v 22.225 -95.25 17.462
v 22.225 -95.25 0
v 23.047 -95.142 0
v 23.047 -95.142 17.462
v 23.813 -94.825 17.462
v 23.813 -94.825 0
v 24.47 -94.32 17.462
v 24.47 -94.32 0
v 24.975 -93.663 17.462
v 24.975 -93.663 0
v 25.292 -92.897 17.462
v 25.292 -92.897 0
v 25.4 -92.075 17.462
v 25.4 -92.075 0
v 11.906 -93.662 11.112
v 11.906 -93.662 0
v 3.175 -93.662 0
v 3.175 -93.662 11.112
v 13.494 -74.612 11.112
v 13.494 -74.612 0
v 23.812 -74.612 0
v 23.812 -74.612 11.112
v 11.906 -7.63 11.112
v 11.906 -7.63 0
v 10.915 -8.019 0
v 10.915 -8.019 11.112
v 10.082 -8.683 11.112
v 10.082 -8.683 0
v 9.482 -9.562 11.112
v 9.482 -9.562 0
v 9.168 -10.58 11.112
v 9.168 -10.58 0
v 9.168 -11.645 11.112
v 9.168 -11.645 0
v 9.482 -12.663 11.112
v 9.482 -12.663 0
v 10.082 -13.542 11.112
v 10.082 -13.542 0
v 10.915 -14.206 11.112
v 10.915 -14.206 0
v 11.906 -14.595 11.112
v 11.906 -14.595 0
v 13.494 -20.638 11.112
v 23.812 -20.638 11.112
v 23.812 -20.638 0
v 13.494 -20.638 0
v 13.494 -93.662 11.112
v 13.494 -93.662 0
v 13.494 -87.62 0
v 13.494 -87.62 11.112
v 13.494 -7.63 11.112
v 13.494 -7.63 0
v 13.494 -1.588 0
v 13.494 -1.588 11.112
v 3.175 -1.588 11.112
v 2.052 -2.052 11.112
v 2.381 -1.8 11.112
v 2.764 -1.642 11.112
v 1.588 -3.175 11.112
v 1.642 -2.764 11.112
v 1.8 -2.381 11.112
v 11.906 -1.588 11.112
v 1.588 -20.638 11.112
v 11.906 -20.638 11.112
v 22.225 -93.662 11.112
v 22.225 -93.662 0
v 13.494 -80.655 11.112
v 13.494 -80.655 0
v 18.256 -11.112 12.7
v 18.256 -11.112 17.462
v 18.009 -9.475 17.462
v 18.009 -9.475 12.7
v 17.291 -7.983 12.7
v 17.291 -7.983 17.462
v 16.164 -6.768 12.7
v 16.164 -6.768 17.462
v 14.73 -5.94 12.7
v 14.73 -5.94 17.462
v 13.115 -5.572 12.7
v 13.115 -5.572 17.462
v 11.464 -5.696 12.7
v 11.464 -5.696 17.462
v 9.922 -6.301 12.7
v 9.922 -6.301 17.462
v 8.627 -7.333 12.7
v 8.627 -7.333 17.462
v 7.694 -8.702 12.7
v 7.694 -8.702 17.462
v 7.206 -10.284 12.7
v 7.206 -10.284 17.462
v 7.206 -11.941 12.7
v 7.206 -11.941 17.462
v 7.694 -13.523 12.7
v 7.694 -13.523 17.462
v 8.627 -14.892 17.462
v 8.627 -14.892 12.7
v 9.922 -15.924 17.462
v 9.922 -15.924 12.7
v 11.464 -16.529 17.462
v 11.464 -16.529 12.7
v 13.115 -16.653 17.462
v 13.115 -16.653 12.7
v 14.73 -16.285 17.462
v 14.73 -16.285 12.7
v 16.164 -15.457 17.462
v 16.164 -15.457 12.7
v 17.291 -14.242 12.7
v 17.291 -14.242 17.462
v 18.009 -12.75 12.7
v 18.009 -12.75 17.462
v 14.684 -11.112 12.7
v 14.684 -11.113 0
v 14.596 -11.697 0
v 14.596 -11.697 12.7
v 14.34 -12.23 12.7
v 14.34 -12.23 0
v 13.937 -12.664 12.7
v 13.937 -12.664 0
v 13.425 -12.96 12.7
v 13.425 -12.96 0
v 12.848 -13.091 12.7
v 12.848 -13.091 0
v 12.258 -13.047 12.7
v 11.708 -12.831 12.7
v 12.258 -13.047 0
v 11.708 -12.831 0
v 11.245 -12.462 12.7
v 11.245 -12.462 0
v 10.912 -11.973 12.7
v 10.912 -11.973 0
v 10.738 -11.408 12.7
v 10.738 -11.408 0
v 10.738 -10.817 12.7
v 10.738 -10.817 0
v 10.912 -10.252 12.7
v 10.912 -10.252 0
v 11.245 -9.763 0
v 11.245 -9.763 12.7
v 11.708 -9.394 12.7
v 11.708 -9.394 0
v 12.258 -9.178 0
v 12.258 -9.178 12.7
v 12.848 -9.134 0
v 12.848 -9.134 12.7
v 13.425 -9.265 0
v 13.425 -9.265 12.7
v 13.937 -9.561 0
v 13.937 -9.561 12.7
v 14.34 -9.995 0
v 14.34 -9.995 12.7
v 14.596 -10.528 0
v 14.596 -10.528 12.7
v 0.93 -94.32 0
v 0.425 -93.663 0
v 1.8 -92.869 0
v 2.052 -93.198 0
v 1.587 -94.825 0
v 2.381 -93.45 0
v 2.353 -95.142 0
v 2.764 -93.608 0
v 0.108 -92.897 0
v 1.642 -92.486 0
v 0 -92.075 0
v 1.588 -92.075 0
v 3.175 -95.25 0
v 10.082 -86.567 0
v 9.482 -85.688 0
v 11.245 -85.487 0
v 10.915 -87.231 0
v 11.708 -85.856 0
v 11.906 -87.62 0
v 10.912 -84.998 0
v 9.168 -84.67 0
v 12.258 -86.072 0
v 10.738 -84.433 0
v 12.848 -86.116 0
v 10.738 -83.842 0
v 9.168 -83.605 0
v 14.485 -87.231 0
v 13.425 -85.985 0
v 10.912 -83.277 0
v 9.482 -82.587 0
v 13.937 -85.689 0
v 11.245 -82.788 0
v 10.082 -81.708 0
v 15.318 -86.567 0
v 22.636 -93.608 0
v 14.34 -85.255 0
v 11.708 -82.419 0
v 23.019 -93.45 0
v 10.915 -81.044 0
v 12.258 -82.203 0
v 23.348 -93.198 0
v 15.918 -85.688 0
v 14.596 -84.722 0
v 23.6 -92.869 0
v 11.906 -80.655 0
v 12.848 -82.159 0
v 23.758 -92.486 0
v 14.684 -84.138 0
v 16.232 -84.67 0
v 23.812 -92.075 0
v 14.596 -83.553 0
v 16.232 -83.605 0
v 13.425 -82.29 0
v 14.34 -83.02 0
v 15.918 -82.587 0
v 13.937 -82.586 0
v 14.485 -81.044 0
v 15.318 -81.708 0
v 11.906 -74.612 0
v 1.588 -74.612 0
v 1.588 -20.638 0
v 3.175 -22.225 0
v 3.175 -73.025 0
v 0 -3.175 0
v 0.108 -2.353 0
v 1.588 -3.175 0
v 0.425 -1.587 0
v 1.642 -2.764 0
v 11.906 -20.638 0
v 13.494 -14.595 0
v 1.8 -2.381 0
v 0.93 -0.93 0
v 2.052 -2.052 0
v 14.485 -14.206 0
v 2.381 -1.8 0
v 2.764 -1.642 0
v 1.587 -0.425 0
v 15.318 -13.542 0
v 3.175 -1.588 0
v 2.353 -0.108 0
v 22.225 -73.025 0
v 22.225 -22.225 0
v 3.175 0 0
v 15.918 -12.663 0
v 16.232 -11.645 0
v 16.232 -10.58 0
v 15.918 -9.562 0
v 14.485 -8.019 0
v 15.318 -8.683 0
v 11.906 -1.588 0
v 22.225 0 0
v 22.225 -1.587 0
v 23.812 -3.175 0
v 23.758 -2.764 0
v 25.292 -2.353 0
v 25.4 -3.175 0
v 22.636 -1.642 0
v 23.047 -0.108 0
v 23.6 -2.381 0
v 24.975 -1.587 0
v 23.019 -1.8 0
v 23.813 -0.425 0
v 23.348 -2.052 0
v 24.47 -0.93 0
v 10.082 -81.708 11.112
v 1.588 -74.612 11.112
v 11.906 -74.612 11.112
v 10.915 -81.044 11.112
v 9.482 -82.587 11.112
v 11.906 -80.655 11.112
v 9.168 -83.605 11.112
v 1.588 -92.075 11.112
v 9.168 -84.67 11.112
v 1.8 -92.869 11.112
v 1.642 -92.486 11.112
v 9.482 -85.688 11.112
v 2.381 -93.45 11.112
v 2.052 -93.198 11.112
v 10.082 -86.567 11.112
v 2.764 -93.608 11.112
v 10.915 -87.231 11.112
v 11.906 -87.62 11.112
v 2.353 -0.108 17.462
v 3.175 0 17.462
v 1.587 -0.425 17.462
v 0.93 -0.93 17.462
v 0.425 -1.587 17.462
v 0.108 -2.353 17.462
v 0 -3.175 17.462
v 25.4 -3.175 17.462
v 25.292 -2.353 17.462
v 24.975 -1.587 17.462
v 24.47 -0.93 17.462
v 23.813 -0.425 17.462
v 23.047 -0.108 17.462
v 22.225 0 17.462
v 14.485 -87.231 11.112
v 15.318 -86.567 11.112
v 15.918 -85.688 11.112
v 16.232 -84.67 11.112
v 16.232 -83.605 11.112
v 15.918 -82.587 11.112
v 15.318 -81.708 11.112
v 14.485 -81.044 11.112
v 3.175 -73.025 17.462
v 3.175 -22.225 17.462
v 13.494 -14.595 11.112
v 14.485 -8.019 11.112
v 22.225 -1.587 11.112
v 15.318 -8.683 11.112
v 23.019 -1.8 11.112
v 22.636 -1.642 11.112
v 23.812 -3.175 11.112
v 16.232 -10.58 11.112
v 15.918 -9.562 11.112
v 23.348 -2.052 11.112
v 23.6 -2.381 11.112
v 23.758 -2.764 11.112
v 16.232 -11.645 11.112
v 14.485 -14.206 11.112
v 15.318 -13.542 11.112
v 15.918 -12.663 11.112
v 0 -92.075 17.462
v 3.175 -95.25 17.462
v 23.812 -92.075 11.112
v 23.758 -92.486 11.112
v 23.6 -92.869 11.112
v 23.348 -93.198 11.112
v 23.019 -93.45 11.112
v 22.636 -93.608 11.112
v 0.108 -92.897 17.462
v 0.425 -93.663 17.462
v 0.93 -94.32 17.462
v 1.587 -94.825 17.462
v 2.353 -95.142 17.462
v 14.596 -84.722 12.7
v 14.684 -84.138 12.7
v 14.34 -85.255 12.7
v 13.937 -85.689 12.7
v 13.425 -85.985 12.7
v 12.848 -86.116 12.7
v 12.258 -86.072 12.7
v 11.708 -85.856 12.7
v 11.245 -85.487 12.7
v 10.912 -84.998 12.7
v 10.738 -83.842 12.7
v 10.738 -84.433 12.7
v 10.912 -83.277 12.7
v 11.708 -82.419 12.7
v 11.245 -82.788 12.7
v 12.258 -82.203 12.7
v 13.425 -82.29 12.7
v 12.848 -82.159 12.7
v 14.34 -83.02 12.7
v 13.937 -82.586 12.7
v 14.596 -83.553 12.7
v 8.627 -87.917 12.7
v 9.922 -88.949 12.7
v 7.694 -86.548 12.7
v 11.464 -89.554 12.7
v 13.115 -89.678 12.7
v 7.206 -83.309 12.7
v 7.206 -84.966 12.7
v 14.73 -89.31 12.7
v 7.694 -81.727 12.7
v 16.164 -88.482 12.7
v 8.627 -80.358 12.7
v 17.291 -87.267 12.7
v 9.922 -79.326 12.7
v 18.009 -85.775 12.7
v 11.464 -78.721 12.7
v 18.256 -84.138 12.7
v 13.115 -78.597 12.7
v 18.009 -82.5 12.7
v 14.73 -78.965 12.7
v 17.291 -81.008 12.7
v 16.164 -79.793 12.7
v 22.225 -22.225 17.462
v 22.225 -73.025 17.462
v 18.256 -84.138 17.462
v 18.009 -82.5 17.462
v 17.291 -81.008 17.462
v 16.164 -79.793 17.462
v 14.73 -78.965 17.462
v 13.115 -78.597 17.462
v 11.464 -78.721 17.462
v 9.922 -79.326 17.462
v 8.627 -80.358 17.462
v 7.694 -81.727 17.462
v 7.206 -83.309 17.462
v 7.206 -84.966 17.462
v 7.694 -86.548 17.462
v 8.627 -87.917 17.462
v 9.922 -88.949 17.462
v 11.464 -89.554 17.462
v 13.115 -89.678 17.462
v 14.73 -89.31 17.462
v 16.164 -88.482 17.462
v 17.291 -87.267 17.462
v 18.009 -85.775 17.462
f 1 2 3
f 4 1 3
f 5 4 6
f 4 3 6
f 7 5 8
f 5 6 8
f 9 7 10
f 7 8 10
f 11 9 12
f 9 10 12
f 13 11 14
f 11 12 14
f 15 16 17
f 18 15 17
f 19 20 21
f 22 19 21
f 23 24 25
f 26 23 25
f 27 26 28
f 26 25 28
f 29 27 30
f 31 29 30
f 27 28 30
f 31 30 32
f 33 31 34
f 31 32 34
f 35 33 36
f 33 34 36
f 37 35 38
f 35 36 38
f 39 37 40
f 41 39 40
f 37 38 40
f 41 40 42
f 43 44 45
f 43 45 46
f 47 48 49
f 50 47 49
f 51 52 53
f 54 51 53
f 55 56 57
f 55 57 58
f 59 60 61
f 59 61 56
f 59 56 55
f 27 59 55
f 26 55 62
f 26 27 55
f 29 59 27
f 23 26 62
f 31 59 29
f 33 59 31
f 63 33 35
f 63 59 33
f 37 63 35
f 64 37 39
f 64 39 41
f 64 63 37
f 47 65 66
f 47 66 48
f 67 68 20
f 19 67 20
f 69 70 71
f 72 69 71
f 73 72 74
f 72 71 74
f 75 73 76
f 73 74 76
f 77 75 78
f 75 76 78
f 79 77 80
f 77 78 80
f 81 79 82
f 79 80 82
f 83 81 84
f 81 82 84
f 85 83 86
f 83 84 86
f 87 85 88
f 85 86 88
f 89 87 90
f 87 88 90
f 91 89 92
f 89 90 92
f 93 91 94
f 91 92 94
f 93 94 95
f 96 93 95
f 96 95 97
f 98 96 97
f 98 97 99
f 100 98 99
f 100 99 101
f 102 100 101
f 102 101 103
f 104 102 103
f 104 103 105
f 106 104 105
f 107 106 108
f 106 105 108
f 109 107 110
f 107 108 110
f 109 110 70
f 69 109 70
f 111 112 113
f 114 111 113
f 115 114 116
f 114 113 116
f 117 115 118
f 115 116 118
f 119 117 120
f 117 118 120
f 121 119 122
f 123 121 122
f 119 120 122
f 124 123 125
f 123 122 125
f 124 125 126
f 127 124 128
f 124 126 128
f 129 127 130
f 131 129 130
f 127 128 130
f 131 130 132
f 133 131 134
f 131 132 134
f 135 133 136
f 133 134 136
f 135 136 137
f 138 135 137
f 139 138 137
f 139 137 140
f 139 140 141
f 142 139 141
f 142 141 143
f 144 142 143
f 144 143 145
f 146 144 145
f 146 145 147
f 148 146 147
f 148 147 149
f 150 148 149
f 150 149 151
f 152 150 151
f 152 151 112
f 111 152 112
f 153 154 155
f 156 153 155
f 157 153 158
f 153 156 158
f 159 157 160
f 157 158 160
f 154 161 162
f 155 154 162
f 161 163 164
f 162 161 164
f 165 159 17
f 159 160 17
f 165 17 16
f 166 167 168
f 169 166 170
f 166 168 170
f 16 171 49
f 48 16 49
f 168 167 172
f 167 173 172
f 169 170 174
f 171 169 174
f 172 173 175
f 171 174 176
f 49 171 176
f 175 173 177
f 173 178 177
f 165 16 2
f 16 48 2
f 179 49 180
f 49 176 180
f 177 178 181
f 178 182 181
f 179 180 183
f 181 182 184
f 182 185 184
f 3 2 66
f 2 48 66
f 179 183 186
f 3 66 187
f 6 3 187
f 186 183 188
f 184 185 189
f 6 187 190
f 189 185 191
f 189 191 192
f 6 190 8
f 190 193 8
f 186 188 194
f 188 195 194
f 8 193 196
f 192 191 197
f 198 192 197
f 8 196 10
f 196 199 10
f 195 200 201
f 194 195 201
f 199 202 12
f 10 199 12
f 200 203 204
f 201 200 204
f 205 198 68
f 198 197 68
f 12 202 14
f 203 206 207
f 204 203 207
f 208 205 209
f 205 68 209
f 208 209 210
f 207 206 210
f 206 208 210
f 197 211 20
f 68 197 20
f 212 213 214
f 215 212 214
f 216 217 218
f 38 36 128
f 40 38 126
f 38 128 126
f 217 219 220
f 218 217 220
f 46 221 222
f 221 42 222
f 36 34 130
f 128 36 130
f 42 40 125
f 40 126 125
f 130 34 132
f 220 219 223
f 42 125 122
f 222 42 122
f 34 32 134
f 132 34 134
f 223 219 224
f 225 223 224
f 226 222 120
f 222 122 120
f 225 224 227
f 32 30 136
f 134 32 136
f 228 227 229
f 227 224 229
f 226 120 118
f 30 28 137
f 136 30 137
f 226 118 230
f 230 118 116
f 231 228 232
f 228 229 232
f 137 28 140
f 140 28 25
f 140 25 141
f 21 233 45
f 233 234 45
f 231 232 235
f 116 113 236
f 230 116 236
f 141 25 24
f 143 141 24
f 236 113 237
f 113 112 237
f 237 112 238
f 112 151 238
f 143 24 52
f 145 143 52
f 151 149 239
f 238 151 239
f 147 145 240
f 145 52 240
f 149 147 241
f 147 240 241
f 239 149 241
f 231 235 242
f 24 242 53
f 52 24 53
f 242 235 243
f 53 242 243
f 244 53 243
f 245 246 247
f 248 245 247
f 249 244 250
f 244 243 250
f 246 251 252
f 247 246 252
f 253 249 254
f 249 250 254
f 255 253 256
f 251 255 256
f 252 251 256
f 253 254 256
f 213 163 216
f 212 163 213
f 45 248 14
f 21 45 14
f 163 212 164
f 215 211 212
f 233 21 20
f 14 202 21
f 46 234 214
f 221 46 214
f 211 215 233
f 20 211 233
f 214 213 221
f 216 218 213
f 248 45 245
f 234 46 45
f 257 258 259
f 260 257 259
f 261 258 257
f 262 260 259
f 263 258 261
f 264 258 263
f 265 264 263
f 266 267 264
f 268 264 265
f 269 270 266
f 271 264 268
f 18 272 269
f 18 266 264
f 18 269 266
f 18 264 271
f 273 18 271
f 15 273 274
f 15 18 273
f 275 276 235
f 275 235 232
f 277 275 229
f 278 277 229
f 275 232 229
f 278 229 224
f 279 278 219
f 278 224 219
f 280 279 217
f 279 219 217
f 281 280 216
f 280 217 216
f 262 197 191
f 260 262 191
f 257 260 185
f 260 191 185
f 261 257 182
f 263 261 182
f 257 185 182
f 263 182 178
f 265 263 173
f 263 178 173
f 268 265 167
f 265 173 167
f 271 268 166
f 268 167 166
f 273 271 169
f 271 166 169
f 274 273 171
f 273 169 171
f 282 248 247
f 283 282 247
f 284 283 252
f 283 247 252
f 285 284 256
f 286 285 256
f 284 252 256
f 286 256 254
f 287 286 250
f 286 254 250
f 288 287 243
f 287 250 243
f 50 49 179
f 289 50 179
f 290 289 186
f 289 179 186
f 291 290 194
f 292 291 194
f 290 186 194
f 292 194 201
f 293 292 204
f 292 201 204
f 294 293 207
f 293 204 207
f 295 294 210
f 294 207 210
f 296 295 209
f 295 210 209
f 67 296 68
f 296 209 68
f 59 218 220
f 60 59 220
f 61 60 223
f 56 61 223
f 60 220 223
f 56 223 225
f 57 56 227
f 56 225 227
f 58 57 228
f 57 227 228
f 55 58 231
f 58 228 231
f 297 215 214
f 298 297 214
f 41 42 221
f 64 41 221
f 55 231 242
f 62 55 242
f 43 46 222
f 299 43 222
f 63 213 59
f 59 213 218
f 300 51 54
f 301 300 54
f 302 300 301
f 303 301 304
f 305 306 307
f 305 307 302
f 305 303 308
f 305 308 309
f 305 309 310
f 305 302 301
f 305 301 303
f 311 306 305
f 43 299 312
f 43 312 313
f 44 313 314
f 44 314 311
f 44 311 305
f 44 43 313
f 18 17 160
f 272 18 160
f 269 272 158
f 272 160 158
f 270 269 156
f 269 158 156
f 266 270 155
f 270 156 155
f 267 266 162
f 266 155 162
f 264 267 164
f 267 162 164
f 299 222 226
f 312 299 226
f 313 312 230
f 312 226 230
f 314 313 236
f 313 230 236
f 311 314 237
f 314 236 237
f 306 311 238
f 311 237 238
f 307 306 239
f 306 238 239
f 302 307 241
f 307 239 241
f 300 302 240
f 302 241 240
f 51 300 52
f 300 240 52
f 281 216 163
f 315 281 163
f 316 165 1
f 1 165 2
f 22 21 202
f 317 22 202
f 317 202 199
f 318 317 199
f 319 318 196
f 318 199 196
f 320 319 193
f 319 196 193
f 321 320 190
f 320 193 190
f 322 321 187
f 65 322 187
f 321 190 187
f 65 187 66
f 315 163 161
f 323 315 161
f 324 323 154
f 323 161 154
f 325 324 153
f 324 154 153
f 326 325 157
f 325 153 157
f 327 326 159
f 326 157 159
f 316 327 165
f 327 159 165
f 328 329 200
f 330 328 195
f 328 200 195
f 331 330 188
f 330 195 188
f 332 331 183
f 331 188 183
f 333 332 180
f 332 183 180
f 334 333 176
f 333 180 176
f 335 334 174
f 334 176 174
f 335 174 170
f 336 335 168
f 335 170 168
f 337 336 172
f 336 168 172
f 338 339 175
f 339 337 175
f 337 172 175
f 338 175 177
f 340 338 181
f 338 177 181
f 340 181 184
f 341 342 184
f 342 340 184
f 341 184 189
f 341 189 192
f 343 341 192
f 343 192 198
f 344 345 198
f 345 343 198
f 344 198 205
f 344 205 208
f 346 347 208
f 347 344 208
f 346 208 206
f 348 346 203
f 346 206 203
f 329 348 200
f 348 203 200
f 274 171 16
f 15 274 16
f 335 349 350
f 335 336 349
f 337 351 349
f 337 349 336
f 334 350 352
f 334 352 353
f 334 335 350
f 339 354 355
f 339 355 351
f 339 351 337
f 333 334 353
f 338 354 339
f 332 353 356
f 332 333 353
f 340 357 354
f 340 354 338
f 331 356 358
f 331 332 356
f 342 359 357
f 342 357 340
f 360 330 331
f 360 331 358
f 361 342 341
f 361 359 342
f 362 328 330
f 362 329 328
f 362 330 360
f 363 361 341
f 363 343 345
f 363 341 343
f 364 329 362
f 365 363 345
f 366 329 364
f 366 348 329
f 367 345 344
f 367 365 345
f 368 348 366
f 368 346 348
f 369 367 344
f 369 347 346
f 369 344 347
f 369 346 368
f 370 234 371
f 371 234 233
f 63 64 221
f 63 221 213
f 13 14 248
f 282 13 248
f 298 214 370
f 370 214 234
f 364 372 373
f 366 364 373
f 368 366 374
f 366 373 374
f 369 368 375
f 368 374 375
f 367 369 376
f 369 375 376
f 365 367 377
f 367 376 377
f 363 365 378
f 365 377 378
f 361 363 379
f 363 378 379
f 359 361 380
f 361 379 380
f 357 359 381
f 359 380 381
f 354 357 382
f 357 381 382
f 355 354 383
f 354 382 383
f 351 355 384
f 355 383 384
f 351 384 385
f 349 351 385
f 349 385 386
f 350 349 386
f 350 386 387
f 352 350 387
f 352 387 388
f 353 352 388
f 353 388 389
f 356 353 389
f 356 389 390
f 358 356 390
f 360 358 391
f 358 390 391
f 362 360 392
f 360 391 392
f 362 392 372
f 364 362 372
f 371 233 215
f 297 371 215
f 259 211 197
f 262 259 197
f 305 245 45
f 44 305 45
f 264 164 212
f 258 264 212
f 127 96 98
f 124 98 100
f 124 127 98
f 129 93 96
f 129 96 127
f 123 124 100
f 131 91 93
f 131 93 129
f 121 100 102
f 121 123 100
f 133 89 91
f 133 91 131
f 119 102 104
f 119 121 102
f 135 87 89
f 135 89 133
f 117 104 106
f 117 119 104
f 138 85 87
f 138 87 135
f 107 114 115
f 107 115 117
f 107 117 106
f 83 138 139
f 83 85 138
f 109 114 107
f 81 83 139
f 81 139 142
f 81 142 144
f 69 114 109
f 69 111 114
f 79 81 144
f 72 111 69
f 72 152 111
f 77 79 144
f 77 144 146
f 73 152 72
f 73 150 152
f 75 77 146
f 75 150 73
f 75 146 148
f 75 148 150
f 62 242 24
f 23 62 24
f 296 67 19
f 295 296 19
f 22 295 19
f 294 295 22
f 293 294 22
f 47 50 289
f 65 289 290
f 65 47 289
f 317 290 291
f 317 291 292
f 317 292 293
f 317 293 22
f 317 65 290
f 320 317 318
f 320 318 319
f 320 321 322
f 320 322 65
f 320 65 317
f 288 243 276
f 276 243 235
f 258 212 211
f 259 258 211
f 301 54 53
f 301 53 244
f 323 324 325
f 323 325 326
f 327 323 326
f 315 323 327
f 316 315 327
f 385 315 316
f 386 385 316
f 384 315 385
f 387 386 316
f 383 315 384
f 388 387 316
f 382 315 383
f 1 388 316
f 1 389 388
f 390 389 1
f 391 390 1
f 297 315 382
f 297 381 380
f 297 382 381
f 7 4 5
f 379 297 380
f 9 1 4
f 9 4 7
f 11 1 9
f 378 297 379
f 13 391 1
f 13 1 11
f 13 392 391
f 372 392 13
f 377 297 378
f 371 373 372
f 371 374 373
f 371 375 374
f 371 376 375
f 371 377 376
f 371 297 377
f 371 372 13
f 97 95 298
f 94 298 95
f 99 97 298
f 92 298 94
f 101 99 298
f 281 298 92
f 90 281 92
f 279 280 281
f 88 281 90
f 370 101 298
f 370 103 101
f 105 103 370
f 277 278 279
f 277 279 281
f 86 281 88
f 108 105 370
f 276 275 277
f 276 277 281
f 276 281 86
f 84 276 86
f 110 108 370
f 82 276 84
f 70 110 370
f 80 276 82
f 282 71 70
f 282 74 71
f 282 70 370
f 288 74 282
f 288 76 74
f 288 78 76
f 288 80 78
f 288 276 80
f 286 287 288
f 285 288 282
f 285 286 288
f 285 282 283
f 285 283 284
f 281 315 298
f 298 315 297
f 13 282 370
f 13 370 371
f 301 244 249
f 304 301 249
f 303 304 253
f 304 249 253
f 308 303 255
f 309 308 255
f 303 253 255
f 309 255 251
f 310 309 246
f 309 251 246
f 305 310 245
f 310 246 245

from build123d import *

# Parameters (mm, degrees)
F1_DEPTH = 17.4625
F3_R     = 1.984375
F4_DEPTH = 17.4635
F5_DEPTH = 3.175
F6_R     = 1.984375
F7_DEPTH = 11.1125
F8_R     = 5.55625
F8_R_2   = 1.984375
F9_DEPTH = 4.7625


with BuildPart() as f1:
    # F0 (on Top) → F1 (new body)
    with BuildSketch(Plane.XY):
        with BuildLine():
            Line((22.225, 0), (3.175, 0))
            ThreePointArc((3.175, 0), (0.9299359697, -0.9299359697), (0, -3.175))
            Line((0, -3.175), (0, -92.075))
            ThreePointArc((0, -92.075), (0.9299359697, -94.3200640303), (3.175, -95.25))
            Line((3.175, -95.25), (22.225, -95.25))
            ThreePointArc((22.225, -95.25), (24.4700640303, -94.3200640303), (25.4, -92.075))
            Line((25.4, -92.075), (25.4, -3.175))
            ThreePointArc((25.4, -3.175), (24.4700640303, -0.9299359697), (22.225, 0))
        make_face()
        Polygon((3.175, -22.225), (12.7, -22.225), (22.225, -22.225), (22.225, -47.625), (22.225, -73.025), (12.7, -73.025), (3.175, -73.025), (3.175, -47.625), align=None, mode=Mode.SUBTRACT)
    extrude(amount=F1_DEPTH)

    # F3 (on face) → F4 (cut, through all)
    with BuildSketch(Plane(origin=(0, 0, 0), x_dir=(1, 0, 0), z_dir=(0, 0, -1))):
        with Locations((12.7, 11.1125)):
            Circle(F3_R)
        with Locations((12.7, 84.1375)):
            Circle(F3_R)
    extrude(amount=-F4_DEPTH, mode=Mode.SUBTRACT)

    # F0 (on Top) → F5 (cut)
    with BuildSketch(Plane.XY):
        Polygon((22.225, -22.225), (12.7, -22.225), (3.175, -22.225), (3.175, -47.625), (3.175, -73.025), (12.7, -73.025), (22.225, -73.025), (22.225, -47.625), align=None)
    extrude(amount=F5_DEPTH, mode=Mode.SUBTRACT)

    # F6 (on face) → F7 (cut)
    with BuildSketch(Plane(origin=(0, 0, 0), x_dir=(1, 0, 0), z_dir=(0, 0, -1))):
        with BuildLine():
            ThreePointArc((11.90625, 80.6549360088), (9.128125, 84.1375), (11.90625, 87.6200639912))
            Line((11.90625, 87.6200639912), (11.90625, 93.6625))
            Line((11.90625, 93.6625), (3.175, 93.6625))
            ThreePointArc((3.175, 93.6625), (2.0524679849, 93.1975320151), (1.5875, 92.075))
            Line((1.5875, 92.075), (1.5875, 74.6125))
            Line((1.5875, 74.6125), (11.90625, 74.6125))
            Line((11.90625, 74.6125), (11.90625, 80.6549360088))
        make_face()
        with BuildLine():
            Line((22.225, 93.6625), (13.49375, 93.6625))
            Line((13.49375, 93.6625), (13.49375, 87.6200639912))
            ThreePointArc((13.49375, 87.6200639912), (16.271875, 84.1375), (13.49375, 80.6549360088))
            Line((13.49375, 80.6549360088), (13.49375, 74.6125))
            Line((13.49375, 74.6125), (23.8125, 74.6125))
            Line((23.8125, 74.6125), (23.8125, 92.075))
            ThreePointArc((23.8125, 92.075), (23.3475320151, 93.1975320151), (22.225, 93.6625))
        make_face()
        with BuildLine():
            Line((11.90625, 20.6375), (1.5875, 20.6375))
            Line((1.5875, 20.6375), (1.5875, 3.175))
            ThreePointArc((1.5875, 3.175), (2.0524679849, 2.0524679849), (3.175, 1.5875))
            Line((3.175, 1.5875), (11.90625, 1.5875))
            Line((11.90625, 1.5875), (11.90625, 7.6299360088))
            ThreePointArc((11.90625, 7.6299360088), (9.128125, 11.1125), (11.90625, 14.5950639912))
            Line((11.90625, 14.5950639912), (11.90625, 20.6375))
        make_face()
        with BuildLine():
            Line((23.8125, 3.175), (23.8125, 20.6375))
            Line((23.8125, 20.6375), (13.49375, 20.6375))
            Line((13.49375, 20.6375), (13.49375, 14.5950639912))
            ThreePointArc((13.49375, 14.5950639912), (16.271875, 11.1125), (13.49375, 7.6299360088))
            Line((13.49375, 7.6299360088), (13.49375, 1.5875))
            Line((13.49375, 1.5875), (22.225, 1.5875))
            ThreePointArc((22.225, 1.5875), (23.3475320151, 2.0524679849), (23.8125, 3.175))
        make_face()
        with Locations((12.7, 11.1125)):
            Circle(F6_R)
    extrude(amount=-F7_DEPTH, mode=Mode.SUBTRACT)

    # F8 (on face) → F9 (cut)
    with BuildSketch(Plane.XY.offset(17.4625)):
        with Locations((12.7, -84.1375)):
            Circle(F8_R)
        with Locations((12.7, -84.1375)):
            Circle(F8_R_2, mode=Mode.SUBTRACT)
        with Locations((12.7, -11.1125)):
            Circle(F8_R)
        with Locations((12.7, -11.1125)):
            Circle(F8_R_2, mode=Mode.SUBTRACT)
        with Locations((12.7, -11.1125)):
            Circle(F8_R_2)
    extrude(amount=-F9_DEPTH, mode=Mode.SUBTRACT)


solid = f1.part
